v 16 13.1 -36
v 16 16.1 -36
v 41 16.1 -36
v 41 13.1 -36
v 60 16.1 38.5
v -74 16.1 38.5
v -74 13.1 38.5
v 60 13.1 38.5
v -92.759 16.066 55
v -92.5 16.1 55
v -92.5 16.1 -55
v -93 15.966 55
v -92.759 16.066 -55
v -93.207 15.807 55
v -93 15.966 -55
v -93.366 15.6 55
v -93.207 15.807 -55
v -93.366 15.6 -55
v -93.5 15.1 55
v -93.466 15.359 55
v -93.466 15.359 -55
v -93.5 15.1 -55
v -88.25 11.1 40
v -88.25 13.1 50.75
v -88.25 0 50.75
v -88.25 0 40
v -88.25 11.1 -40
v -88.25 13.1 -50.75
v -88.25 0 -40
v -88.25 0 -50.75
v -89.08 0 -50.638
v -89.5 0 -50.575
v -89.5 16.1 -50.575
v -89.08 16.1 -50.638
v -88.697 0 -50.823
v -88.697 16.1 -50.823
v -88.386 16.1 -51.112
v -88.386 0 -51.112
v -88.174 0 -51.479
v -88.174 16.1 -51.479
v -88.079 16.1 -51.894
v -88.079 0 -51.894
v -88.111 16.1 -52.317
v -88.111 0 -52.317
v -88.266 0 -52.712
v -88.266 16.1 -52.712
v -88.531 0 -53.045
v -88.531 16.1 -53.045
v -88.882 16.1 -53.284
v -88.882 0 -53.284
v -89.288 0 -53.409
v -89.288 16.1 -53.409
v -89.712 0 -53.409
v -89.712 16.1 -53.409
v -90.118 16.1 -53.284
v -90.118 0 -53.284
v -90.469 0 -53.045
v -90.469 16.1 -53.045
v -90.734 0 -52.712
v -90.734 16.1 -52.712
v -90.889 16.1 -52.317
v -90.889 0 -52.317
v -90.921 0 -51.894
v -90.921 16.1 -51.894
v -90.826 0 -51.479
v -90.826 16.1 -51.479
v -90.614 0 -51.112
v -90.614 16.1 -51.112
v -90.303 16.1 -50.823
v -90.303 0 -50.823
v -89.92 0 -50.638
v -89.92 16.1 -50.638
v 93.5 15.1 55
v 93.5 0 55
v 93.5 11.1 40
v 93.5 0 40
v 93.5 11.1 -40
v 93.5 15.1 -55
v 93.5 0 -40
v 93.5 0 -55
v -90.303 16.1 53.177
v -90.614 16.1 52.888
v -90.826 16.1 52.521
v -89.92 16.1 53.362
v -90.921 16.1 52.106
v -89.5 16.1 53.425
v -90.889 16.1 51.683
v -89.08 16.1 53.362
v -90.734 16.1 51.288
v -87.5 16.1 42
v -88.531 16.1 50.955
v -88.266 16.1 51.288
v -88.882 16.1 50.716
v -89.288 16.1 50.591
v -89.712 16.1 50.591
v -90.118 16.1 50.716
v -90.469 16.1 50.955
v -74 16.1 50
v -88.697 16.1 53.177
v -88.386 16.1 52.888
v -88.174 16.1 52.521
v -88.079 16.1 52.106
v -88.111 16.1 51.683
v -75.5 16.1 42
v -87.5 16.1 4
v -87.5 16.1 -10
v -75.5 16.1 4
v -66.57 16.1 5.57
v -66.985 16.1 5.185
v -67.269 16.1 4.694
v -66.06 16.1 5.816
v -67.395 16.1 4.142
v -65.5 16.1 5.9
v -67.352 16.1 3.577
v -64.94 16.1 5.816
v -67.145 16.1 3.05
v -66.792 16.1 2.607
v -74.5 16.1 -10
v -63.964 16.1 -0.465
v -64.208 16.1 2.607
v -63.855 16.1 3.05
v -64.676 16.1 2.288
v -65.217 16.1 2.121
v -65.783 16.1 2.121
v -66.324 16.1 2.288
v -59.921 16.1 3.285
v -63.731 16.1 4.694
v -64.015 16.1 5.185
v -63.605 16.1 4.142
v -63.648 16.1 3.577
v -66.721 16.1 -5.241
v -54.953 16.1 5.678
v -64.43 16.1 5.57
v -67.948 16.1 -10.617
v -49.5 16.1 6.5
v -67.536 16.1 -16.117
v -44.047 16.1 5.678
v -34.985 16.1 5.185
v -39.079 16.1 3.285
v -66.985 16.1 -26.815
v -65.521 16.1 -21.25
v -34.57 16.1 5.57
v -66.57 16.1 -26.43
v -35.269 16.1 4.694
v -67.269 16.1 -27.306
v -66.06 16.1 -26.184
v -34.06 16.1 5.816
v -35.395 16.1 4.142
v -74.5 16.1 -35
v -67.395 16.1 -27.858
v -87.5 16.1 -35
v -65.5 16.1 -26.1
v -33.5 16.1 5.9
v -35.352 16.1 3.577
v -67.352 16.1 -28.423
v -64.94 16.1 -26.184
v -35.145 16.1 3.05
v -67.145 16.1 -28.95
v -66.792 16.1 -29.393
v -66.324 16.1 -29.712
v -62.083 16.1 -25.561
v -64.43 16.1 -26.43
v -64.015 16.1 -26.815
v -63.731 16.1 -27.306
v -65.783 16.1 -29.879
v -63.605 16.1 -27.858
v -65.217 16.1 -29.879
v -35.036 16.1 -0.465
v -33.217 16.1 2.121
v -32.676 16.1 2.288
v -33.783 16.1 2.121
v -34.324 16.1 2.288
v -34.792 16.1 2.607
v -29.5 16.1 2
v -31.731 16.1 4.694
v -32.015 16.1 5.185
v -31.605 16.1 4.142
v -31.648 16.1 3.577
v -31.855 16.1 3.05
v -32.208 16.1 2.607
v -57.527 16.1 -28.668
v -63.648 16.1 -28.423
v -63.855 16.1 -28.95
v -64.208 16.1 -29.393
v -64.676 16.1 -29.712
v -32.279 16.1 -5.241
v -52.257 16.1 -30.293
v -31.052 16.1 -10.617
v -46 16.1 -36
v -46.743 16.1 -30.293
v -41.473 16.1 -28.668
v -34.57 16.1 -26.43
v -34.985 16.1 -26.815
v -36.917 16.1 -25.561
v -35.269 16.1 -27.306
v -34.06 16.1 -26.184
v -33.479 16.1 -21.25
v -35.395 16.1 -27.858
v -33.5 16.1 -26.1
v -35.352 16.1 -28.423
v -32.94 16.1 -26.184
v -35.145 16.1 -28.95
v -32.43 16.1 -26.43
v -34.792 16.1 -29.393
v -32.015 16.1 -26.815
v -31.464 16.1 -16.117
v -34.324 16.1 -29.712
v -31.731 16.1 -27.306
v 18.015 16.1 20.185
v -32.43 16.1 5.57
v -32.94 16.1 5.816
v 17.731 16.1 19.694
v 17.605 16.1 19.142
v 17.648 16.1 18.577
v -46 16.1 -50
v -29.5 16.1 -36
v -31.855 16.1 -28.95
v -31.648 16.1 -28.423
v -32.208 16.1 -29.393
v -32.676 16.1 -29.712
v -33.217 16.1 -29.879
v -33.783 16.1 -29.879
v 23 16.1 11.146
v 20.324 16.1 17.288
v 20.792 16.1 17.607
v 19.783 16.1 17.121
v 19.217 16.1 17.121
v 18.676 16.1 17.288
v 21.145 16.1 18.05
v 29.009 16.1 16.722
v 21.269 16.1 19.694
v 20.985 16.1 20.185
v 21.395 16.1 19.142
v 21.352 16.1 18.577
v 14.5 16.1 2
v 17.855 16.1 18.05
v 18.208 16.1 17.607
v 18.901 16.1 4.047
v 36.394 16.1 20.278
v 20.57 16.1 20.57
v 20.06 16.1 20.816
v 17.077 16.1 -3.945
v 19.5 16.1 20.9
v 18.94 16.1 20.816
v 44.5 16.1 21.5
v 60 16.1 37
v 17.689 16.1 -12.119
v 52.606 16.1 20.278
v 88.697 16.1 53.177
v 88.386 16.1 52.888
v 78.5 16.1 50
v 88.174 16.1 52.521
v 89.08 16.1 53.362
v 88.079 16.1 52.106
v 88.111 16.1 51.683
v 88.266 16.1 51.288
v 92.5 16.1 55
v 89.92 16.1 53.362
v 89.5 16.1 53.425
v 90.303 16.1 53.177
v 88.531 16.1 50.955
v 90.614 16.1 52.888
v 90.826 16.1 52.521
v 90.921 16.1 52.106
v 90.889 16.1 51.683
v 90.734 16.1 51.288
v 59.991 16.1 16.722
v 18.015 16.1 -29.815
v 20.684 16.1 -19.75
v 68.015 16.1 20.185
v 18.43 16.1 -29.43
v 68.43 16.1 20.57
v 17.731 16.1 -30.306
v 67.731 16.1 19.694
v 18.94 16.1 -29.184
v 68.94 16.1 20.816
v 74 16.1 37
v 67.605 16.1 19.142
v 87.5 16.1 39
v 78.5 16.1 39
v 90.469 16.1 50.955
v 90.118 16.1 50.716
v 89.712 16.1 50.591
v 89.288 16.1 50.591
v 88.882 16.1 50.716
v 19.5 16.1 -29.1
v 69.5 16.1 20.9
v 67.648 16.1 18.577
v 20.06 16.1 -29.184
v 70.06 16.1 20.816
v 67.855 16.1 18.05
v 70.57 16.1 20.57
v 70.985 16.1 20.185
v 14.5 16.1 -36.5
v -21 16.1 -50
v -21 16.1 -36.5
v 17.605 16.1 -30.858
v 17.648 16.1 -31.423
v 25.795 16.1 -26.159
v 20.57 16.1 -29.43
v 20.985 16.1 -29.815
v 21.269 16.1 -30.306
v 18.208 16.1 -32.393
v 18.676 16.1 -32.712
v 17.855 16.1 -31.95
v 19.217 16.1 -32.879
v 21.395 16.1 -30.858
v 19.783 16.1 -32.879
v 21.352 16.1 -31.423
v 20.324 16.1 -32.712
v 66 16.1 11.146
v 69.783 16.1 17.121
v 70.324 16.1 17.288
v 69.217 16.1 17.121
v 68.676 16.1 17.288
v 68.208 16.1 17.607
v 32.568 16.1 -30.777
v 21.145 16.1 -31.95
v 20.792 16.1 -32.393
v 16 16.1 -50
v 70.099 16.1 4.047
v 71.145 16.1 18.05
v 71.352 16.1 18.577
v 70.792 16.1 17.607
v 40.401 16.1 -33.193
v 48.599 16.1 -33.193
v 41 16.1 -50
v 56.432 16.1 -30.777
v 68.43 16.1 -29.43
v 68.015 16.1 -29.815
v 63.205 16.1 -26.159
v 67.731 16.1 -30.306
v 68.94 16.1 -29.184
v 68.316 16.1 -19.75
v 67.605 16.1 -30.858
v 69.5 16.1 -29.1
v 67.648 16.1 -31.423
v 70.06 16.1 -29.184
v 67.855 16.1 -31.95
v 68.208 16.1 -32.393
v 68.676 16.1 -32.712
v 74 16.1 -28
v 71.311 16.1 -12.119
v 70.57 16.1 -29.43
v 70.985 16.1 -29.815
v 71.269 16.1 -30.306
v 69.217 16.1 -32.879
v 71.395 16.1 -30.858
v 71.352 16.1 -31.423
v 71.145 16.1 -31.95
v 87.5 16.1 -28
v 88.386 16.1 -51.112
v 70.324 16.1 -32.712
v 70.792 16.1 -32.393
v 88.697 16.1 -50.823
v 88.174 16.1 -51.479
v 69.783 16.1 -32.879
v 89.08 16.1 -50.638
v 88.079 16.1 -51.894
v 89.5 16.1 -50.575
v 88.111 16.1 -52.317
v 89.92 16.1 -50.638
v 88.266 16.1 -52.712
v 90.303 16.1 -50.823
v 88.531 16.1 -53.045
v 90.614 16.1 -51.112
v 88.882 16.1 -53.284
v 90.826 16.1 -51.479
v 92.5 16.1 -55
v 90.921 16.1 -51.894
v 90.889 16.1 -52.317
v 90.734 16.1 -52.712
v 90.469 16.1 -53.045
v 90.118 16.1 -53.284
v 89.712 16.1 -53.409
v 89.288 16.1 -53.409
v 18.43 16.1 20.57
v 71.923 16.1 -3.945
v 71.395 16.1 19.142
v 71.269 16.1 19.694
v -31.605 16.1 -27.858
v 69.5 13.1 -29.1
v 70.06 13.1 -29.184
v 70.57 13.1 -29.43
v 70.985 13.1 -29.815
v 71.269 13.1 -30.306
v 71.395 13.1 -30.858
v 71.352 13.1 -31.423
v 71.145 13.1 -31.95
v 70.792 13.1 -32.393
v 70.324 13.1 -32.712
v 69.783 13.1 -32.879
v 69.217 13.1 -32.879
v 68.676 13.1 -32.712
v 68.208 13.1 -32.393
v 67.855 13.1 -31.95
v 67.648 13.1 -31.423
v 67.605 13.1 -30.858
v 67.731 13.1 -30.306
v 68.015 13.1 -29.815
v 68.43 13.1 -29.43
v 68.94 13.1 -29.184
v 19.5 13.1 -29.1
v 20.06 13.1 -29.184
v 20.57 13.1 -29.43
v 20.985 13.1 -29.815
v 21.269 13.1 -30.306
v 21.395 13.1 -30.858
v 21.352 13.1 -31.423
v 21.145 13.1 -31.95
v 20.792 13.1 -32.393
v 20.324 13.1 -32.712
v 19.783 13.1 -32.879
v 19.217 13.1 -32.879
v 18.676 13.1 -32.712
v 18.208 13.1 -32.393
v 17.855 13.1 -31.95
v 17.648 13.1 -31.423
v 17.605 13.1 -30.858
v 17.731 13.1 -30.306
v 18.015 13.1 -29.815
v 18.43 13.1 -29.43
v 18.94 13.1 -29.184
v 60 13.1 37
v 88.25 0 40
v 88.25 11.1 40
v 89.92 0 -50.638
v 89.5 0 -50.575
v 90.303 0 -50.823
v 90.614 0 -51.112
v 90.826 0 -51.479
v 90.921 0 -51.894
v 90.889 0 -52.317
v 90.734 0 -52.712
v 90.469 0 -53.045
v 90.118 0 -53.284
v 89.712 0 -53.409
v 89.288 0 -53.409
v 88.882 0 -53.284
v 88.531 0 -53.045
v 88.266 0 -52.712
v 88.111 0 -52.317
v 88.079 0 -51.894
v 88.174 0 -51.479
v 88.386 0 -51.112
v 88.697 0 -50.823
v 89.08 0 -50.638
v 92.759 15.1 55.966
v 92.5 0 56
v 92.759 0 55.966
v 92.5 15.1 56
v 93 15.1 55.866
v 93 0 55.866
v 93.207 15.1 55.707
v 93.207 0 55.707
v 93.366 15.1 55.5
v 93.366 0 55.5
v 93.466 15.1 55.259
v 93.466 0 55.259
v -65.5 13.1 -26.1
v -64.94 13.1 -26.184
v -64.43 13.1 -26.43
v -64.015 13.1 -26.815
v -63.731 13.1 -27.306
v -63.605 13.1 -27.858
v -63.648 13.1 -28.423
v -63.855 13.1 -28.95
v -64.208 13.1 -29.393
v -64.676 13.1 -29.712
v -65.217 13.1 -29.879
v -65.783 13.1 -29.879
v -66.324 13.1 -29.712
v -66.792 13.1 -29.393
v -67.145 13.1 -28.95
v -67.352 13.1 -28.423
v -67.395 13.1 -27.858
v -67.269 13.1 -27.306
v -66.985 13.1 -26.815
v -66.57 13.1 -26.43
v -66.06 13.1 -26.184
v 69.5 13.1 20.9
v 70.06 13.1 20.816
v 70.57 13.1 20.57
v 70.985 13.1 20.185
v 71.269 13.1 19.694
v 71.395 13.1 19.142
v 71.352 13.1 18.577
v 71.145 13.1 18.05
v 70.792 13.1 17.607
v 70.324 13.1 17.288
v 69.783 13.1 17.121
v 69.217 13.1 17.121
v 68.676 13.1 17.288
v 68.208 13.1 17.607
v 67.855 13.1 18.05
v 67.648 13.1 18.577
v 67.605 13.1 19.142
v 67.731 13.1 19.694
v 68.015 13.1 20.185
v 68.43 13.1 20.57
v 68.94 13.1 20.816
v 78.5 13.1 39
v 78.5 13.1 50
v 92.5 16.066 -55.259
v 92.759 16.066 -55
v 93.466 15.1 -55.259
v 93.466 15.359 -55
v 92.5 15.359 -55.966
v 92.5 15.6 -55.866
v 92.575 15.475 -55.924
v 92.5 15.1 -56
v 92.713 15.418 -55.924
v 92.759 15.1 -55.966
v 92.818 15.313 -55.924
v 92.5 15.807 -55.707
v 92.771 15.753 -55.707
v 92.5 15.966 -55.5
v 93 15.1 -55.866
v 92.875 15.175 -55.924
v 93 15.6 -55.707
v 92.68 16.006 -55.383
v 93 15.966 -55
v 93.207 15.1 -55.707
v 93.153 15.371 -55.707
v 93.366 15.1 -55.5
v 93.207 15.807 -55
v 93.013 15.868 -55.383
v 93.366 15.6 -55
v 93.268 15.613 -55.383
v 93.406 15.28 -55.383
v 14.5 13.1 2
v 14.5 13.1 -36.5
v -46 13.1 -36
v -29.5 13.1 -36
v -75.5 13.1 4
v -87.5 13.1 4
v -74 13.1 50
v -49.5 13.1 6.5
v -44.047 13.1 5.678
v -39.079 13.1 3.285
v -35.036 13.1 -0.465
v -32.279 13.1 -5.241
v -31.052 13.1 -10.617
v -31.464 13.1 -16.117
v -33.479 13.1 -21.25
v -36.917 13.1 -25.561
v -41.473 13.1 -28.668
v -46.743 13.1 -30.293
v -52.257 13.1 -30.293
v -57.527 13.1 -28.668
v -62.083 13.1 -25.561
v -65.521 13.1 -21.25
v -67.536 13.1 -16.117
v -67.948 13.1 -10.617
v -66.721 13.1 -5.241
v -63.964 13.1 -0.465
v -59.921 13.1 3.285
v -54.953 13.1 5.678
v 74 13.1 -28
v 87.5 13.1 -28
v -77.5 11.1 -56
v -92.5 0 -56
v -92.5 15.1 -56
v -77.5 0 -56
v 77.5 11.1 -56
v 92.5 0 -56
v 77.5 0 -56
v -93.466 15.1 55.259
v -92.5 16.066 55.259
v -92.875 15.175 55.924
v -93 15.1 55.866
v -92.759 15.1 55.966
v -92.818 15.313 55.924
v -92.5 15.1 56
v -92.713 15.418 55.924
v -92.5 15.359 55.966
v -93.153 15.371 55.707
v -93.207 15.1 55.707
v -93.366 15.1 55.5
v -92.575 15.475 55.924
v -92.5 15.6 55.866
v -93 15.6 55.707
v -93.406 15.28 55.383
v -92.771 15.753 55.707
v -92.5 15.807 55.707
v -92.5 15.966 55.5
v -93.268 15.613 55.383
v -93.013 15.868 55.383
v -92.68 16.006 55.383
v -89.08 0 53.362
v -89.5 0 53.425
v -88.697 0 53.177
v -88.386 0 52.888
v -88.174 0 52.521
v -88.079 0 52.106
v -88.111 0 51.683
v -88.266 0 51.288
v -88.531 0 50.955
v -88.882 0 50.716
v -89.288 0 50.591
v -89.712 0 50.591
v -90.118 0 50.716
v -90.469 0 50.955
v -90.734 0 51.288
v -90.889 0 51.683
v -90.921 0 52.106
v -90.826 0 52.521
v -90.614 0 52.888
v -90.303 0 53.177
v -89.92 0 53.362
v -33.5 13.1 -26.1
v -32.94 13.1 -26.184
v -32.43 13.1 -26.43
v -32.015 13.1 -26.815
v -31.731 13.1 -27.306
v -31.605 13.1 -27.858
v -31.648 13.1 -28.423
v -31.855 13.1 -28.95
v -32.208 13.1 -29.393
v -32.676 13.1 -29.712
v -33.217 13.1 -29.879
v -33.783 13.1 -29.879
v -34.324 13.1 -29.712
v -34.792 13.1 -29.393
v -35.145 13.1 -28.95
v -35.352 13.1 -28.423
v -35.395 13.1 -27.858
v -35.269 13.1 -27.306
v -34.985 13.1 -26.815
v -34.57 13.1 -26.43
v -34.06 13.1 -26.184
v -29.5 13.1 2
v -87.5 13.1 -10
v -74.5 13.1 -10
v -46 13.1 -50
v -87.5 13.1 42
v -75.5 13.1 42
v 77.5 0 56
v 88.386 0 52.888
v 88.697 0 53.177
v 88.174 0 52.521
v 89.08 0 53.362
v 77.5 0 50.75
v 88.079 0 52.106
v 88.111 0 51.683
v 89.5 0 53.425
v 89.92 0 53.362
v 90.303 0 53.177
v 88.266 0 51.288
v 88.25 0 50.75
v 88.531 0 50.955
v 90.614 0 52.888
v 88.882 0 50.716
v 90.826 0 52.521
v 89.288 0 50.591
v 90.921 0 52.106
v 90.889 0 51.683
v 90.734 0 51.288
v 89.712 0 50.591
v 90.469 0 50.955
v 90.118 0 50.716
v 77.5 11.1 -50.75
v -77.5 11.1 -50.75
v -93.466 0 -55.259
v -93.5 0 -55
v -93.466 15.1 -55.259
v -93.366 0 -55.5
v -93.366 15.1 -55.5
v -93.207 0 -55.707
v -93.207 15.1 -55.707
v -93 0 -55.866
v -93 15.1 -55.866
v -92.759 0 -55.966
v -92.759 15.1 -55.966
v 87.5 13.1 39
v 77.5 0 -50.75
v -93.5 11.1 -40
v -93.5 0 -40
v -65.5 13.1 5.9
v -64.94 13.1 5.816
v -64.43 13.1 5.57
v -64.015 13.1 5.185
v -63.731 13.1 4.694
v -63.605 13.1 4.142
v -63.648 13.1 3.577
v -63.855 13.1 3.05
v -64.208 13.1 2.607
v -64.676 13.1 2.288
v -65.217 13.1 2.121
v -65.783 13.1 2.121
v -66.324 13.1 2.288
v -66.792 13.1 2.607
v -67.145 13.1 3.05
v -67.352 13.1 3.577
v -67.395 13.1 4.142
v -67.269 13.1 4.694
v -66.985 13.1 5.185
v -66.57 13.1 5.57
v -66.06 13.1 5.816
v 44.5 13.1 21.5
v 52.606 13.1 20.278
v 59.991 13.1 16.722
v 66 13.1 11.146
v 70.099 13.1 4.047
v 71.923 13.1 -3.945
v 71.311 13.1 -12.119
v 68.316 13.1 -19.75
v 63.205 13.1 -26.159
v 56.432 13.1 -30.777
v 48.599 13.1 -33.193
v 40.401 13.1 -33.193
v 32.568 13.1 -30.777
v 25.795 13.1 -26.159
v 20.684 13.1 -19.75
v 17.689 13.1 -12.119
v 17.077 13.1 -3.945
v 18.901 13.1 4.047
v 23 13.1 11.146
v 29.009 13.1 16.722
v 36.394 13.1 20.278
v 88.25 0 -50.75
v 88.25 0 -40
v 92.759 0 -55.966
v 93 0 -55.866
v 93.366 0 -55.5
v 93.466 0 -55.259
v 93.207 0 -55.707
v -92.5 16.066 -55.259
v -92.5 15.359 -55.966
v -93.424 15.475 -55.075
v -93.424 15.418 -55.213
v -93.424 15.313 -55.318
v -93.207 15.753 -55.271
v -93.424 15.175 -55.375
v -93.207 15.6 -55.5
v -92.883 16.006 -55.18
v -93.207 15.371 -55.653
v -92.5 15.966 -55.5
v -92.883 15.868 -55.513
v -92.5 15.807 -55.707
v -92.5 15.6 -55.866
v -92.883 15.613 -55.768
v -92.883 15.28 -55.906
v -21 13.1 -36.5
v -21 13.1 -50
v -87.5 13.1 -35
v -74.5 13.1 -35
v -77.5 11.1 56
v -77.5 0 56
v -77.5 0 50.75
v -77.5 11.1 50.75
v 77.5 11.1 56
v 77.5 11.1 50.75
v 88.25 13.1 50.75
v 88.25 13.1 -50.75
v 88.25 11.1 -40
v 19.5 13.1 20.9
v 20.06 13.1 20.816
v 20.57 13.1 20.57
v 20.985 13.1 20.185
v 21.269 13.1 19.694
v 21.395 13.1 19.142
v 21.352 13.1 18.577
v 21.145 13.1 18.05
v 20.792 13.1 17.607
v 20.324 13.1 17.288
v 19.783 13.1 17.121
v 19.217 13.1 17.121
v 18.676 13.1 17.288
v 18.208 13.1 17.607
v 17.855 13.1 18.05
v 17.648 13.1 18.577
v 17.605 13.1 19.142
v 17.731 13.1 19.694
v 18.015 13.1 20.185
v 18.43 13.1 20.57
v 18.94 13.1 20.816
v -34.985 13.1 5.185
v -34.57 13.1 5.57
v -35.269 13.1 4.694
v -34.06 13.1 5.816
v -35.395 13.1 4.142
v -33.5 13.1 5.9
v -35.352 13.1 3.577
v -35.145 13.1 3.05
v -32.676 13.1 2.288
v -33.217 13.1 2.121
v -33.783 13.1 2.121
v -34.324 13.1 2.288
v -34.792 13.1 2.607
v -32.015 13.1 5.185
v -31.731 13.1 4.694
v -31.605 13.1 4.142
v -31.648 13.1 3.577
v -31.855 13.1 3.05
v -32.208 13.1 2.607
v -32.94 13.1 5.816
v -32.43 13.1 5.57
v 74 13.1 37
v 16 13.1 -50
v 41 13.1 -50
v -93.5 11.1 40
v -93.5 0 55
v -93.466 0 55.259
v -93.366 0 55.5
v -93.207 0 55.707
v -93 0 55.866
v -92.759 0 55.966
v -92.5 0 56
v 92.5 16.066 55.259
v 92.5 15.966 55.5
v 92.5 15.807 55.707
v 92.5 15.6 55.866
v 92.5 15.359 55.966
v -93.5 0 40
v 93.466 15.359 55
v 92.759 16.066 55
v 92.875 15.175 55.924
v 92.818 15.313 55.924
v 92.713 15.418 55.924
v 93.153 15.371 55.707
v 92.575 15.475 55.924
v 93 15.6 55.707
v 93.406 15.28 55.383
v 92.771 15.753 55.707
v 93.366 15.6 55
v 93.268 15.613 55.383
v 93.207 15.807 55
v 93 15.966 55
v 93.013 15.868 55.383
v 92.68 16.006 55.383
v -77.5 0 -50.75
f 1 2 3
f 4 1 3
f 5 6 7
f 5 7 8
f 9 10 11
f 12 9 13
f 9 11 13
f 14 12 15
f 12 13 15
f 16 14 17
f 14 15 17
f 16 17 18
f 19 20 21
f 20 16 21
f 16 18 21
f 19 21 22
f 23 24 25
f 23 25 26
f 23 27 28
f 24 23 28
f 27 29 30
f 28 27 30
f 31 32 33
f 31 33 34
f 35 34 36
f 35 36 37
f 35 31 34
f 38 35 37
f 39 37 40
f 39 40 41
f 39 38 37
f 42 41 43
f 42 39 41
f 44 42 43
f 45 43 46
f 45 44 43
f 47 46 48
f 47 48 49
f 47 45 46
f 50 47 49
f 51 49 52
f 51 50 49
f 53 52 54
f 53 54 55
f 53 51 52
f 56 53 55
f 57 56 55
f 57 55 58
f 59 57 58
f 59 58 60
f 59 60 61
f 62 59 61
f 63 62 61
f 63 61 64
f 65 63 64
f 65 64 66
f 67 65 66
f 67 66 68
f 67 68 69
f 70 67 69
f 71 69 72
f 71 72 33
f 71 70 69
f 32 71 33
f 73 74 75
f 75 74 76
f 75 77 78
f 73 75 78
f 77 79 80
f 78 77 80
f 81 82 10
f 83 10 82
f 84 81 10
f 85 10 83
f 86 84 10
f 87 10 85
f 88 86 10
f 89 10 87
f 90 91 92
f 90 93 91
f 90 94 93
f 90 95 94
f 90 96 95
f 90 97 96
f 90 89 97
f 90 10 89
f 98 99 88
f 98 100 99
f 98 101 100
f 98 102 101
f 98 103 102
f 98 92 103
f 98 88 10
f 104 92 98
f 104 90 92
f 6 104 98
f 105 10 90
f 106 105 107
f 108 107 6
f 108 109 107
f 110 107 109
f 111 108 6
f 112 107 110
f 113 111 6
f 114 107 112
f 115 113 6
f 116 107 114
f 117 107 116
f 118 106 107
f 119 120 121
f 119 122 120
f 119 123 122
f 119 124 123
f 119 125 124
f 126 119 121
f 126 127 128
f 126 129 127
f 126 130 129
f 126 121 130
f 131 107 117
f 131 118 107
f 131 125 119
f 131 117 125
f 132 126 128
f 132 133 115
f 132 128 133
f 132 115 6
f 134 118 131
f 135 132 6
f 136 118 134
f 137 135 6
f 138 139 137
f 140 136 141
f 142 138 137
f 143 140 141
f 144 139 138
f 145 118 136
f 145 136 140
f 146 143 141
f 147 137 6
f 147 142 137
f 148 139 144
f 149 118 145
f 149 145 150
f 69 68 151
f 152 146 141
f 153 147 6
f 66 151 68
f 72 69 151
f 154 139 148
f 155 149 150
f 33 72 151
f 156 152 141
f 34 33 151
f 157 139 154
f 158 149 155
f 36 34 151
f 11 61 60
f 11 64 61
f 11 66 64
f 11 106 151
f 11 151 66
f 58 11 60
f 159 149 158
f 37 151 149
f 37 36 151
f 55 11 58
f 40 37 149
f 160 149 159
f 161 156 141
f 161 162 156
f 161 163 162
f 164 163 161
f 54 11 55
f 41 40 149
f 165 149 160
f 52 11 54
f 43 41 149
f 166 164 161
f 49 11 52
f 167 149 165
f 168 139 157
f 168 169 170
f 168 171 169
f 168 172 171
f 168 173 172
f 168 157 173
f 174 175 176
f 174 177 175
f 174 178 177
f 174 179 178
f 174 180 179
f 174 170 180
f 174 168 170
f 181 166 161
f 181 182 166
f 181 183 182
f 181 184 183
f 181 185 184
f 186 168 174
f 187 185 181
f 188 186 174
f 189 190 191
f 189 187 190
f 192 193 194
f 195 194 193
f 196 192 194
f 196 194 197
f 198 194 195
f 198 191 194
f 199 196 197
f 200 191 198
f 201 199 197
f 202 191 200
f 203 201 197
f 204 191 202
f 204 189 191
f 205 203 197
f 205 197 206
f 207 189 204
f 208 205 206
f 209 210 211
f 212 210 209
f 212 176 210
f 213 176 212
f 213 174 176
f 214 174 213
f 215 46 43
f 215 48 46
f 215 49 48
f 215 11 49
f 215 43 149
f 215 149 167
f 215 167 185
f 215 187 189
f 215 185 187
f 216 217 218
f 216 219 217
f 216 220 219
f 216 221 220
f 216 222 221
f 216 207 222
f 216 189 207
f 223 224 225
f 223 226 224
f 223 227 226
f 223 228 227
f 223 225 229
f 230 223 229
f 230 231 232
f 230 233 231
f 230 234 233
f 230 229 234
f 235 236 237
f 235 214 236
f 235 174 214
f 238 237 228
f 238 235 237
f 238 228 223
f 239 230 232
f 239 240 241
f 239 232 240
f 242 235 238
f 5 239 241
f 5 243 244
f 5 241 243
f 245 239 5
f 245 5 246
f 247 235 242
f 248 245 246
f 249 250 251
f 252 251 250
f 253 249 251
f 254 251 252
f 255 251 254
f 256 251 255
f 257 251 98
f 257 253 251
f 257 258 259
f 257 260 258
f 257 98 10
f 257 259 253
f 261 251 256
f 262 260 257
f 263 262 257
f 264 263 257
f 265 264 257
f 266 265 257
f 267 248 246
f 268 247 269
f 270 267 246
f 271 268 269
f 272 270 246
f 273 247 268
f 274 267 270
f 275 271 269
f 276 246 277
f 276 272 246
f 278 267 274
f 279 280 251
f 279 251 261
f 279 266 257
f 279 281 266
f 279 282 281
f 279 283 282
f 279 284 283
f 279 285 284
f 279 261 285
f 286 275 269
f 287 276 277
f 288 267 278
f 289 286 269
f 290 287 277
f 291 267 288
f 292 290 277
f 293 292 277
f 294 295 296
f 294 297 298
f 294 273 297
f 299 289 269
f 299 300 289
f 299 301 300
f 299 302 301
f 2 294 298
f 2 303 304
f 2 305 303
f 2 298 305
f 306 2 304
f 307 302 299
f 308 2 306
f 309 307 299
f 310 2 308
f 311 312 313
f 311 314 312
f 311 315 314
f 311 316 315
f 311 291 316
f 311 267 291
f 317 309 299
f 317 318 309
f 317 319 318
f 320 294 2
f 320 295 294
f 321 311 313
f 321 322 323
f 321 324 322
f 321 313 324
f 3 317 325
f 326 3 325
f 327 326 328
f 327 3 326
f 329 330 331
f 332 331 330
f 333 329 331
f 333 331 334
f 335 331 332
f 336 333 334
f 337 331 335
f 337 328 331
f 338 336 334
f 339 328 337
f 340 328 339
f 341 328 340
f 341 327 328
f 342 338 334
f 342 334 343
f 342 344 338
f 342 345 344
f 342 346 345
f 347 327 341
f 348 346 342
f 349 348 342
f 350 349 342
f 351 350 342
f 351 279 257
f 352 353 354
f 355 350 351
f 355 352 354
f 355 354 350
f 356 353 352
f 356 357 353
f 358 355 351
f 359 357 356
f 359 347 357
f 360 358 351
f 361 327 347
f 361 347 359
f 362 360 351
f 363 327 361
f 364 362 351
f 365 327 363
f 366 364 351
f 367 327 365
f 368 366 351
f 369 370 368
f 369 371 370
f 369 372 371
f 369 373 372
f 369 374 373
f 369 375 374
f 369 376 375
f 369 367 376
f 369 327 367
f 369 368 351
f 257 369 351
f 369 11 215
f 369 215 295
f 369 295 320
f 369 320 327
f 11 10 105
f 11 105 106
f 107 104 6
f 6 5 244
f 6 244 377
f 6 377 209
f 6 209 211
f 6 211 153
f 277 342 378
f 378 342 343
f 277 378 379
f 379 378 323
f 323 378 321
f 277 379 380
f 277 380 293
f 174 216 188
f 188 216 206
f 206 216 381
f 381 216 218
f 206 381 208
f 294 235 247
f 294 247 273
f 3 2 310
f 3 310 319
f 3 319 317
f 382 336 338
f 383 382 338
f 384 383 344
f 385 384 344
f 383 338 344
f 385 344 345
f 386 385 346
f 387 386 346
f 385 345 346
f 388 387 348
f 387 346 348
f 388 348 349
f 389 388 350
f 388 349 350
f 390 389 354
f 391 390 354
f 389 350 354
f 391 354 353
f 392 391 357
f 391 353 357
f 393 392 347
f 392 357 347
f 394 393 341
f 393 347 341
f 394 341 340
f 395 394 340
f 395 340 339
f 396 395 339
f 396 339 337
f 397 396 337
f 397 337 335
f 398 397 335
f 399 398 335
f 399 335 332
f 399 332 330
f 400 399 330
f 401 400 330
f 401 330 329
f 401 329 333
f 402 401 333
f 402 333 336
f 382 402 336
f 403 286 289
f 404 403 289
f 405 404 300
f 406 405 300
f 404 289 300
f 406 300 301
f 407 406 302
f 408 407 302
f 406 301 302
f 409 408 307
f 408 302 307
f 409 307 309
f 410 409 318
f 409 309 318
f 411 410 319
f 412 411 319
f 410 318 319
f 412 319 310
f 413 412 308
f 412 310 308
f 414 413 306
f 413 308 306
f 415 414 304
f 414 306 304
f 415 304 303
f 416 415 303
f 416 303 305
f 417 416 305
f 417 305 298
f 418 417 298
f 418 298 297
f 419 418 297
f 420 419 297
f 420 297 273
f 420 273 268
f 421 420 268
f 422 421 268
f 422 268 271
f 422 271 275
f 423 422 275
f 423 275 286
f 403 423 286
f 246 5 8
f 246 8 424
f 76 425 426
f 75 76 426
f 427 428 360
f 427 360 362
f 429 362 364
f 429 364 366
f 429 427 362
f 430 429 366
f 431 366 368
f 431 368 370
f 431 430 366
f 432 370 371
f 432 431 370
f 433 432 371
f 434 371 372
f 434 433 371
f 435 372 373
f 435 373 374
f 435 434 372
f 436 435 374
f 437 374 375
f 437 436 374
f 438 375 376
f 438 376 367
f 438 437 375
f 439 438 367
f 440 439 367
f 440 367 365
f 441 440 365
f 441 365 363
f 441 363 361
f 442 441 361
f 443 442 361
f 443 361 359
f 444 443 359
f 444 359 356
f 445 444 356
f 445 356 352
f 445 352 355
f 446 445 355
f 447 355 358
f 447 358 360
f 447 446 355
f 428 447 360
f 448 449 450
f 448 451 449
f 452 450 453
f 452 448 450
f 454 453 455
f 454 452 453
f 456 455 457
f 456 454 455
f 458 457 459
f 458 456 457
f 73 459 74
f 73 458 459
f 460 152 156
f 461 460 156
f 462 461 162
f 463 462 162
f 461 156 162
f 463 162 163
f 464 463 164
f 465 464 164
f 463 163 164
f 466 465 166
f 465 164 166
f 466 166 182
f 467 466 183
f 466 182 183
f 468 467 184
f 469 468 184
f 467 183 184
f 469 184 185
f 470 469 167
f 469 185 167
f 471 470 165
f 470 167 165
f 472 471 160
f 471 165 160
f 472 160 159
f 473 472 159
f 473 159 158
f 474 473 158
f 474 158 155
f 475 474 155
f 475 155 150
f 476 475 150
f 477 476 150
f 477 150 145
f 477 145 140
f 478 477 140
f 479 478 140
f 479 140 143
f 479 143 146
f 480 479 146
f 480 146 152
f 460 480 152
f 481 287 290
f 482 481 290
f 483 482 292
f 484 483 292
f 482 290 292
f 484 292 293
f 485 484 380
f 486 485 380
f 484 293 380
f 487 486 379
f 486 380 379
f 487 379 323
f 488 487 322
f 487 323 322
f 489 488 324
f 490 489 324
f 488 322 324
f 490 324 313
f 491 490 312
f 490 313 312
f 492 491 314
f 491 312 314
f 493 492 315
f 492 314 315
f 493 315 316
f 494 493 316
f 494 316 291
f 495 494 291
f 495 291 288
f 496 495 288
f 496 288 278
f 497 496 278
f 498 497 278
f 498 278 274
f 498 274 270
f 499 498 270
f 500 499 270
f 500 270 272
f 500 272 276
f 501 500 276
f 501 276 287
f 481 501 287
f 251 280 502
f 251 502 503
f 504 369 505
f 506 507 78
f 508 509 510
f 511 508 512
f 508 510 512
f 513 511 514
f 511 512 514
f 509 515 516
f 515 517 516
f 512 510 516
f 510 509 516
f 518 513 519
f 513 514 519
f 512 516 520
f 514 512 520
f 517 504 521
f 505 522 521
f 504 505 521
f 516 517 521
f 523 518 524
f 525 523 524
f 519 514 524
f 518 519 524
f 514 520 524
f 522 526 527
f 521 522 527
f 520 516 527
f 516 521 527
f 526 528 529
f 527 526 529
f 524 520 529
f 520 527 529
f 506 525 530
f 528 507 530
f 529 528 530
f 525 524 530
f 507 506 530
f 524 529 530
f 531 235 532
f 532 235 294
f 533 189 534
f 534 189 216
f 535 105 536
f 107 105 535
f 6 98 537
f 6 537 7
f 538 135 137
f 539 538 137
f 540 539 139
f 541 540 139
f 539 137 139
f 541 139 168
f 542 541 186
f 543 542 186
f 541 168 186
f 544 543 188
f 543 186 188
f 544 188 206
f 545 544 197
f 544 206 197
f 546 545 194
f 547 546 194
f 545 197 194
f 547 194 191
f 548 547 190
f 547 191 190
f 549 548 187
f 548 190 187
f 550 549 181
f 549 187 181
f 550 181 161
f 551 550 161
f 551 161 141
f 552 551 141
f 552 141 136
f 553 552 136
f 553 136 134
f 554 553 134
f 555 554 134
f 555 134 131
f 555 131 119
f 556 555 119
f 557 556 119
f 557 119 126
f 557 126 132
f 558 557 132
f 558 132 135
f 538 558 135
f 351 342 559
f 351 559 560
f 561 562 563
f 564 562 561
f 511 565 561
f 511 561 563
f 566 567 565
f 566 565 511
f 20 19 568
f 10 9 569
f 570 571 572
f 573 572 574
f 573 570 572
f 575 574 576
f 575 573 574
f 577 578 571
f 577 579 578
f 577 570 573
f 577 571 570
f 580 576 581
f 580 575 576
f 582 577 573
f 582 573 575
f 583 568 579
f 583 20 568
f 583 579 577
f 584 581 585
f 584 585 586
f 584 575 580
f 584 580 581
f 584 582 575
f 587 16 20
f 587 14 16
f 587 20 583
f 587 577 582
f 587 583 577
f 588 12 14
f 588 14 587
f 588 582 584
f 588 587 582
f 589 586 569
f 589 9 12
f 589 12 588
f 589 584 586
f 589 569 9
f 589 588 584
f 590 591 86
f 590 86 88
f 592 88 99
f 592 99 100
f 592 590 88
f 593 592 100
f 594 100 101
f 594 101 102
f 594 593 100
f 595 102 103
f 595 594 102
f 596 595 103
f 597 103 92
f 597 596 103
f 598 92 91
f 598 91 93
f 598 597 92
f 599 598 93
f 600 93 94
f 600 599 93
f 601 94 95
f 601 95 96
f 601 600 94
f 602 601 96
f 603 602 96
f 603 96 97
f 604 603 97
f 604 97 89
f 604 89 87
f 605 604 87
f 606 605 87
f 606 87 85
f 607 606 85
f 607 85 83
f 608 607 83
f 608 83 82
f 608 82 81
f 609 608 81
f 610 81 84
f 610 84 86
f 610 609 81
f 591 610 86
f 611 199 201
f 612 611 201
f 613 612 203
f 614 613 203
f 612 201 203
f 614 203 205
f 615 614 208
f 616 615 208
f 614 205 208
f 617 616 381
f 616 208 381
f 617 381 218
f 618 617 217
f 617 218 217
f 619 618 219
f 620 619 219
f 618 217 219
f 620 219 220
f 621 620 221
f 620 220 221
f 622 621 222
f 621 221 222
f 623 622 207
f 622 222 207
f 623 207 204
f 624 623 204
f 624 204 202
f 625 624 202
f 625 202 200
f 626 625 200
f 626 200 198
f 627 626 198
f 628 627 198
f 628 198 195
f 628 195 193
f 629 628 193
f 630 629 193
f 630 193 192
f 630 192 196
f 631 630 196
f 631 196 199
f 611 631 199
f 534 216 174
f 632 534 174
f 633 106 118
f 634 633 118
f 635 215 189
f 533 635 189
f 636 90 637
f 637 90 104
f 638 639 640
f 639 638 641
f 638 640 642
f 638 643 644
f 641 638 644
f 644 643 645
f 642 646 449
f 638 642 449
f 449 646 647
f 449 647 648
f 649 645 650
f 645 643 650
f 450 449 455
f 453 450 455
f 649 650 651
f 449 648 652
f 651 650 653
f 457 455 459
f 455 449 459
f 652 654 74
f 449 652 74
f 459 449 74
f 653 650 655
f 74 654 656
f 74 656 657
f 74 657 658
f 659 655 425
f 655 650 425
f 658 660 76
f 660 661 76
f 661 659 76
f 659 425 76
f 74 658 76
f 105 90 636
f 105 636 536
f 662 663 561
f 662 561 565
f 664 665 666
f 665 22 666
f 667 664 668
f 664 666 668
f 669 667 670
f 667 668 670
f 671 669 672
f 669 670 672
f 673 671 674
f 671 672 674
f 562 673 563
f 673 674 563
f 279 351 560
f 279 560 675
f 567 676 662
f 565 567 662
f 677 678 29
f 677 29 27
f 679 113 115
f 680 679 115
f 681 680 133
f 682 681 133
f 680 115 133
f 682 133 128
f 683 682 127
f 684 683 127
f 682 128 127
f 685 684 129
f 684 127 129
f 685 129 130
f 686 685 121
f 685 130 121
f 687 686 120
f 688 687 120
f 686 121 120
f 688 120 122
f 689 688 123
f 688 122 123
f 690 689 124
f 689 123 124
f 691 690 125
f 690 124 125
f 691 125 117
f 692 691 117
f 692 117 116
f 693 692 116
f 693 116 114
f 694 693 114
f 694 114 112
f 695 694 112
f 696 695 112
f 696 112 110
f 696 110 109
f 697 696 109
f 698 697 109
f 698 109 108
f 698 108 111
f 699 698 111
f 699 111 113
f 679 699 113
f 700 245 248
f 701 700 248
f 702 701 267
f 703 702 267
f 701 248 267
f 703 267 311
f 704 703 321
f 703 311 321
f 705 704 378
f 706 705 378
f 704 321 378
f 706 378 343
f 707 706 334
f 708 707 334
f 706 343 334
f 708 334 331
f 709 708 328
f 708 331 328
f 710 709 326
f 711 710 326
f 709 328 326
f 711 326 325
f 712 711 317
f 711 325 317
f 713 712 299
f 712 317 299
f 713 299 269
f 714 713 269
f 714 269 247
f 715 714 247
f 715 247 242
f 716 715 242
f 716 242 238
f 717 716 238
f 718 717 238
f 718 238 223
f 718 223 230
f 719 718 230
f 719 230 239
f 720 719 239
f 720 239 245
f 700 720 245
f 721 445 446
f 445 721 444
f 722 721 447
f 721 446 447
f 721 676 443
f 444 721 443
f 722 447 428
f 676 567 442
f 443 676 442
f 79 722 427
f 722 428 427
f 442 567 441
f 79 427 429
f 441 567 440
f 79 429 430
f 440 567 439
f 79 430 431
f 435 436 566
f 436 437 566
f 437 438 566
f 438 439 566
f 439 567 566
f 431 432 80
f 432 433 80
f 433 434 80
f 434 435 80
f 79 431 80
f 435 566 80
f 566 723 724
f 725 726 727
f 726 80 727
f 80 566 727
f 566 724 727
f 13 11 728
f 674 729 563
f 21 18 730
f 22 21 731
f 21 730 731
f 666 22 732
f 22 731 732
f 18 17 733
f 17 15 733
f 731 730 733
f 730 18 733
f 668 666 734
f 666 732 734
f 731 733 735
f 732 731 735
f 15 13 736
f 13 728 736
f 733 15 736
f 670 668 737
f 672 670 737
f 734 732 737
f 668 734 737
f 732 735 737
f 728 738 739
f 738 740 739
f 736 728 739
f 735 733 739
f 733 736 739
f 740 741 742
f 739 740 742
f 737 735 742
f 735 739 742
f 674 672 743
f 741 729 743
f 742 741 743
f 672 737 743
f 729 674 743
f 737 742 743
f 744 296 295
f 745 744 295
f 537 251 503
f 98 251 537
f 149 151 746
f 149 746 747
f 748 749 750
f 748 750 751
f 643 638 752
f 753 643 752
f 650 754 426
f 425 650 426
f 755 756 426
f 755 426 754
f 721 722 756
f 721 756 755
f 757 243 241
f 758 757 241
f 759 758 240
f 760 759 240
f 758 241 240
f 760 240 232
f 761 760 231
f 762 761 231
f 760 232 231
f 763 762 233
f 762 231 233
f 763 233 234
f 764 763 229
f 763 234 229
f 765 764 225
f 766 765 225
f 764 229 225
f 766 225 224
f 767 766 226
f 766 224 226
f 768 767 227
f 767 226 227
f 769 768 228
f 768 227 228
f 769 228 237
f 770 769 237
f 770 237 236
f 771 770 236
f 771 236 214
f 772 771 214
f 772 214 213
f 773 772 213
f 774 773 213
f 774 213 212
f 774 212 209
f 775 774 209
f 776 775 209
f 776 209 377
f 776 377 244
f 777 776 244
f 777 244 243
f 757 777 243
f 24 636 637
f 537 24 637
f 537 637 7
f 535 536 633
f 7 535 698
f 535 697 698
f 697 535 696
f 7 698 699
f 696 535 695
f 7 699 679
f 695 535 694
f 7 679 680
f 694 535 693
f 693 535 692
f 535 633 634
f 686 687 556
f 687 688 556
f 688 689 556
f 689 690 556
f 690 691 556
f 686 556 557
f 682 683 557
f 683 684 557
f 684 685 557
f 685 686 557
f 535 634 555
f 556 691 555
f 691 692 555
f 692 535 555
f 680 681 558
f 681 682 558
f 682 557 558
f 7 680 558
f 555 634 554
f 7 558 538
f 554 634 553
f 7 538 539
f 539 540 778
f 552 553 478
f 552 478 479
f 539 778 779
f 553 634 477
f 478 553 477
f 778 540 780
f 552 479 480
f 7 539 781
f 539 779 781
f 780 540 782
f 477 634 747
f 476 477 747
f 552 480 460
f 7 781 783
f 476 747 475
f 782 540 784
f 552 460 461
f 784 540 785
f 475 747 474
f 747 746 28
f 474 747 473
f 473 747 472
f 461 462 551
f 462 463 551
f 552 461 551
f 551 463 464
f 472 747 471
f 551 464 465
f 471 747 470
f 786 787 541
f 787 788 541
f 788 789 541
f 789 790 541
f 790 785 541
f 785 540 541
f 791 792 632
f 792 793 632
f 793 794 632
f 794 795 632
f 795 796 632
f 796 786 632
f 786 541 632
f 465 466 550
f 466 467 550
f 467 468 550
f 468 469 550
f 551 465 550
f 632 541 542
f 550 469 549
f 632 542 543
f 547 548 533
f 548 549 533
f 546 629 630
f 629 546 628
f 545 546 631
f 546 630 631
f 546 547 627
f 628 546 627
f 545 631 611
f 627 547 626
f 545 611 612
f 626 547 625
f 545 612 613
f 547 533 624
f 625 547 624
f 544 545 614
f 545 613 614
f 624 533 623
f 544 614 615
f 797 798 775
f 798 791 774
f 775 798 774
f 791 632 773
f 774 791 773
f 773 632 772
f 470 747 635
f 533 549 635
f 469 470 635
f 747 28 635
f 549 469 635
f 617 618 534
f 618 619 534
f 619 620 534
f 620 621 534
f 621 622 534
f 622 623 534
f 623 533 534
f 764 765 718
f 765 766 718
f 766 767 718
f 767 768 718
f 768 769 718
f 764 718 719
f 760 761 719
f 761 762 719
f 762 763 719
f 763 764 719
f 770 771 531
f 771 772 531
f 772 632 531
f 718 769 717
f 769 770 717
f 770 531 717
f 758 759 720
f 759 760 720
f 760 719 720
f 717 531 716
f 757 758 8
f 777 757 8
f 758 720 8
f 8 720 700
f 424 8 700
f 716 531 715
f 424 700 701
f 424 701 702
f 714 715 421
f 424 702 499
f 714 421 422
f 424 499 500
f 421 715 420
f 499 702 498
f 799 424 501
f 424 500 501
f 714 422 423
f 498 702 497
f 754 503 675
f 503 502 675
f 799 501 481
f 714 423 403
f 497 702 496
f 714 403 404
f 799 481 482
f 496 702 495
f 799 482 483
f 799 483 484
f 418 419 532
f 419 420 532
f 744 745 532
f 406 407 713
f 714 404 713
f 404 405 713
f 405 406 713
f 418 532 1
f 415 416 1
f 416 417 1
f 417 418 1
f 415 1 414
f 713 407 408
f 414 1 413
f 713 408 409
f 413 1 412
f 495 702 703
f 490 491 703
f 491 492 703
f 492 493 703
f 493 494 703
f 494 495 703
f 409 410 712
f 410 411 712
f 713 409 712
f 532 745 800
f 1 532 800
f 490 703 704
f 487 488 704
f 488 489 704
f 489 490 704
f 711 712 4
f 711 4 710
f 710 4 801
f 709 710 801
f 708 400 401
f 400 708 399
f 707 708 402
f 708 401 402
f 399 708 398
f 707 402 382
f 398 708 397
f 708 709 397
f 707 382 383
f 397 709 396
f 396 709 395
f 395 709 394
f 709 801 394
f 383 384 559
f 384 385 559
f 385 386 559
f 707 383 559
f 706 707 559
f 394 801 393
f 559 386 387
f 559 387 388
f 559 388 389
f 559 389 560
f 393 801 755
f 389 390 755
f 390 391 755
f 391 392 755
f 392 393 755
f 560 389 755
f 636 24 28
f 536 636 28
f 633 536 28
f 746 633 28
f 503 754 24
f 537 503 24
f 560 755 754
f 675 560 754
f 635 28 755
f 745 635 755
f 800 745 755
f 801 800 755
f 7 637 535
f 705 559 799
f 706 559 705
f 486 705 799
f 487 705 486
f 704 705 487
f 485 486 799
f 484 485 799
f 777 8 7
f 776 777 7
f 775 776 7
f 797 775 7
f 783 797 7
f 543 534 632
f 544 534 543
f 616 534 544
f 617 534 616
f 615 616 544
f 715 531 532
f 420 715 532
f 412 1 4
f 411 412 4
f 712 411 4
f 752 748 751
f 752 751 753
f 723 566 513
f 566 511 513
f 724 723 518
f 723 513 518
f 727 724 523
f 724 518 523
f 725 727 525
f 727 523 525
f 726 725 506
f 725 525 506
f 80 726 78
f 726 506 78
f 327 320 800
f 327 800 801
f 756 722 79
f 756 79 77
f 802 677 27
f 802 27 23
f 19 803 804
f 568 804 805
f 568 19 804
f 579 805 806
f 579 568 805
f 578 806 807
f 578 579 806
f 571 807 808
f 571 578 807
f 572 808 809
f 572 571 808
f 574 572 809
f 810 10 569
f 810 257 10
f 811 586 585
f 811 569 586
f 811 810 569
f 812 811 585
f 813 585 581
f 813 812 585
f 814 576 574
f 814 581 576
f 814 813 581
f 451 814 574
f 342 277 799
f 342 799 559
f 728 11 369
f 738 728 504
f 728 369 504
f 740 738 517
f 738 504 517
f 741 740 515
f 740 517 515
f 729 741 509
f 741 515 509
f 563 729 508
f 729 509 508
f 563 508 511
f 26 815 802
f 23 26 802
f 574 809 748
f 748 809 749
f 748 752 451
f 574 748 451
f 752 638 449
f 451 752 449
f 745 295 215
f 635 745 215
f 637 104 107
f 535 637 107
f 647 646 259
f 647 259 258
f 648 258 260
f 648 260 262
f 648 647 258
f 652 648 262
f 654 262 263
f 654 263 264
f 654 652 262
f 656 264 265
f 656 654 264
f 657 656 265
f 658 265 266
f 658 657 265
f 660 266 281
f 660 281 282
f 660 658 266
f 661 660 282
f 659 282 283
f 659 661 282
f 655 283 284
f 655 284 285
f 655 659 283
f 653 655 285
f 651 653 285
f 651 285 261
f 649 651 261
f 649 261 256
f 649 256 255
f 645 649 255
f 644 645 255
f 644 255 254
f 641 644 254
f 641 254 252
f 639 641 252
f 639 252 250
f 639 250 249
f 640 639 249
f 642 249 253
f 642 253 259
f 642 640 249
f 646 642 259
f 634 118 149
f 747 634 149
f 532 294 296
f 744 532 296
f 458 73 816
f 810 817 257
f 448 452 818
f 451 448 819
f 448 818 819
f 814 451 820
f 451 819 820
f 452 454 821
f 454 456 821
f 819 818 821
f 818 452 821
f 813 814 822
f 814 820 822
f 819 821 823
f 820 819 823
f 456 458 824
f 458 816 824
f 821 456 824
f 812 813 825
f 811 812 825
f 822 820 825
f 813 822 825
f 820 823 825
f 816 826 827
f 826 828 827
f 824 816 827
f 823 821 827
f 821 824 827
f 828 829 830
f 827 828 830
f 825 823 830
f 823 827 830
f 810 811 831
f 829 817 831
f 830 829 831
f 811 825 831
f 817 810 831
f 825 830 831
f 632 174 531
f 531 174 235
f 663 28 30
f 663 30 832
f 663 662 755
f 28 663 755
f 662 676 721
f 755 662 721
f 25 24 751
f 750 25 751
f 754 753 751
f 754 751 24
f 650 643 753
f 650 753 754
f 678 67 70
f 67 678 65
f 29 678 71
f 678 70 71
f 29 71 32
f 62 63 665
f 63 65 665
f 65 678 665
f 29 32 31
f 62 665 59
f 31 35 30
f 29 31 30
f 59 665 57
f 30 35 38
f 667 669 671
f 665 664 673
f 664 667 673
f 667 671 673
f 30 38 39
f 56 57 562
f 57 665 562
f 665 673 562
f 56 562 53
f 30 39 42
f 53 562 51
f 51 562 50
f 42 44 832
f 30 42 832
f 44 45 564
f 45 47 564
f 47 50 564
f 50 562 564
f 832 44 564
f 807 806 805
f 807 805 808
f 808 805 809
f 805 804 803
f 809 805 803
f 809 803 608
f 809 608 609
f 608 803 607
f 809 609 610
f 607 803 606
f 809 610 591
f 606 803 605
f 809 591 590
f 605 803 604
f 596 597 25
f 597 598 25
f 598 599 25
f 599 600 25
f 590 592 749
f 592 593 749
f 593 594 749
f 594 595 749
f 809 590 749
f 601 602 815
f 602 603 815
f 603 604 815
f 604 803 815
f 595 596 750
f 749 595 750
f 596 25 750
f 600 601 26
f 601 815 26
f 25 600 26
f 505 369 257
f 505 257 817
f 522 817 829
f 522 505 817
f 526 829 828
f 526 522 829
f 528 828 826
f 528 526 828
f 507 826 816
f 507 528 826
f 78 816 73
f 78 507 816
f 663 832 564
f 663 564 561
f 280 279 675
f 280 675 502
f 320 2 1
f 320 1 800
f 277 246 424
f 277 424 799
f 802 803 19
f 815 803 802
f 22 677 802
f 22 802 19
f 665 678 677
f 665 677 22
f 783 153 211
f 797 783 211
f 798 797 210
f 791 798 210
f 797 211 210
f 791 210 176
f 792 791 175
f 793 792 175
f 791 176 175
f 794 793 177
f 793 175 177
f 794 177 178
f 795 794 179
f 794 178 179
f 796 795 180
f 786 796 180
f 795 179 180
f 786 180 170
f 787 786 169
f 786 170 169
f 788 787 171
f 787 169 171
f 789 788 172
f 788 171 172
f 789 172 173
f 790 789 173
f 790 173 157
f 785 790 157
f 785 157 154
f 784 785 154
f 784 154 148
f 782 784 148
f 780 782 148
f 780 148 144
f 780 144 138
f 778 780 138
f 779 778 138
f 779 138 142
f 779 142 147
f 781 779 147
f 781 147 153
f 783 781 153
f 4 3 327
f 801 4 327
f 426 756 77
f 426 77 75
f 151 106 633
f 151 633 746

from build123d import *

# Parameters (mm, degrees)
SKETCH1_W                = 187
SKETCH1_H                = 112
SKETCH1_R                = 1.425
SKETCH1_W_2              = 176.5
SKETCH1_H_2              = 101.5
EDGE_2_DEPTH             = 16.1
SKETCH2_W                = 176.5
SKETCH2_H                = 101.5
TOP_COVER_DEPTH          = 3
COMPONENTS_CUTOUTS_REACH = 112.17
SKETCH3_W                = 12
SKETCH3_H                = 38
SKETCH3_W_2              = 13
SKETCH3_H_2              = 25
SKETCH3_W_3              = 25
SKETCH3_H_3              = 14
FAN_HOLES_REACH          = 112.17
SKETCH6_R                = 1.9
SKETCH6_R_2              = 18.5
SKETCH6_R_3              = 27.5
SKETCH4_W                = 155
SKETCH4_H                = 11.1
LENGTH_AIR_VENTS_DEPTH   = 147.783718443
SKETCH5_W                = 80
SKETCH5_H                = 11.1
WIDTH_AIR_VENTS_DEPTH    = 196.867838095
FILLET1_R                = 1


with BuildPart() as part:
    # Sketch1 → Edge 2 (new body)
    with BuildSketch(Plane(origin=(0, 0, 0), x_dir=(1, 0, 0), z_dir=(0, 1, 0))):
        Rectangle(SKETCH1_W, SKETCH1_H)
        with Locations((-89.5, -52)):
            Circle(SKETCH1_R, mode=Mode.SUBTRACT)
        with Locations((89.5, -52)):
            Circle(SKETCH1_R, mode=Mode.SUBTRACT)
        with Locations((89.5, 52)):
            Circle(SKETCH1_R, mode=Mode.SUBTRACT)
        with Locations((-89.5, 52)):
            Circle(SKETCH1_R, mode=Mode.SUBTRACT)
        Rectangle(SKETCH1_W_2, SKETCH1_H_2, mode=Mode.SUBTRACT)
    extrude(amount=EDGE_2_DEPTH)

    # Sketch2 → Top Cover (add)
    with BuildSketch(Plane(origin=(0, 16.1, 0), x_dir=(1, 0, 0), z_dir=(0, 1, 0))):
        Rectangle(SKETCH2_W, SKETCH2_H)
    extrude(amount=-TOP_COVER_DEPTH)

    # Sketch3 → Components Cutouts (cut, up to next)
    with BuildSketch(Plane(origin=(0, 16.1, 0), x_dir=(1, 0, 0), z_dir=(0, 1, 0)), mode=Mode.PRIVATE) as components_cutouts_sk1:
        with Locations((-81.5, -23)):
            Rectangle(SKETCH3_W, SKETCH3_H)
    components_cutouts_tool1 = extrude(components_cutouts_sk1.sketch, amount=-COMPONENTS_CUTOUTS_REACH, mode=Mode.PRIVATE) & part.part
    # Sketch3 → Components Cutouts (cut, up to next)
    with BuildSketch(Plane(origin=(0, 16.1, 0), x_dir=(1, 0, 0), z_dir=(0, 1, 0)), mode=Mode.PRIVATE) as components_cutouts_sk2:
        Polygon((-29.5, 36), (-29.5, -2), (14.5, -2), (14.5, 36.5), (-21, 36.5), (-21, 50), (-46, 50), (-46, 36), align=None)
    components_cutouts_tool2 = extrude(components_cutouts_sk2.sketch, amount=-COMPONENTS_CUTOUTS_REACH, mode=Mode.PRIVATE) & part.part
    # Sketch3 → Components Cutouts (cut, up to next)
    with BuildSketch(Plane(origin=(0, 16.1, 0), x_dir=(1, 0, 0), z_dir=(0, 1, 0)), mode=Mode.PRIVATE) as components_cutouts_sk3:
        with Locations((-81, 22.5)):
            Rectangle(SKETCH3_W_2, SKETCH3_H_2)
    components_cutouts_tool3 = extrude(components_cutouts_sk3.sketch, amount=-COMPONENTS_CUTOUTS_REACH, mode=Mode.PRIVATE) & part.part
    # Sketch3 → Components Cutouts (cut, up to next)
    with BuildSketch(Plane(origin=(0, 16.1, 0), x_dir=(1, 0, 0), z_dir=(0, 1, 0)), mode=Mode.PRIVATE) as components_cutouts_sk4:
        Polygon((60, -38.5), (60, -37), (74, -37), (74, 28), (87.5, 28), (87.5, -39), (78.5, -39), (78.5, -50), (-74, -50), (-74, -38.5), align=None)
    components_cutouts_tool4 = extrude(components_cutouts_sk4.sketch, amount=-COMPONENTS_CUTOUTS_REACH, mode=Mode.PRIVATE) & part.part
    # Sketch3 → Components Cutouts (cut, up to next)
    with BuildSketch(Plane(origin=(0, 16.1, 0), x_dir=(1, 0, 0), z_dir=(0, 1, 0)), mode=Mode.PRIVATE) as components_cutouts_sk5:
        with Locations((28.5, 43)):
            Rectangle(SKETCH3_W_3, SKETCH3_H_3)
    components_cutouts_tool5 = extrude(components_cutouts_sk5.sketch, amount=-COMPONENTS_CUTOUTS_REACH, mode=Mode.PRIVATE) & part.part
    add(components_cutouts_tool1.solids().sort_by_distance((-81.5, 16.1, 23))[0], mode=Mode.SUBTRACT)
    add(components_cutouts_tool2.solids().sort_by_distance((-11.924347, 16.1, -21.628845))[0], mode=Mode.SUBTRACT)
    add(components_cutouts_tool3.solids().sort_by_distance((-81, 16.1, -22.5))[0], mode=Mode.SUBTRACT)
    add(components_cutouts_tool4.solids().sort_by_distance((61.793495, 16.1, 37.75))[0], mode=Mode.SUBTRACT)
    add(components_cutouts_tool5.solids().sort_by_distance((28.5, 16.1, -43))[0], mode=Mode.SUBTRACT)

    # Sketch6 → Fan Holes (cut, up to next)
    with BuildSketch(Plane(origin=(0, 16.1, 0), x_dir=(1, 0, 0), z_dir=(0, 1, 0)), mode=Mode.PRIVATE) as fan_holes_sk1:
        with Locations((-65.5, -4)):
            Circle(SKETCH6_R)
    fan_holes_tool1 = extrude(fan_holes_sk1.sketch, amount=-FAN_HOLES_REACH, mode=Mode.PRIVATE) & part.part
    # Sketch6 → Fan Holes (cut, up to next)
    with BuildSketch(Plane(origin=(0, 16.1, 0), x_dir=(1, 0, 0), z_dir=(0, 1, 0)), mode=Mode.PRIVATE) as fan_holes_sk2:
        with Locations((-65.5, 28)):
            Circle(SKETCH6_R)
    fan_holes_tool2 = extrude(fan_holes_sk2.sketch, amount=-FAN_HOLES_REACH, mode=Mode.PRIVATE) & part.part
    # Sketch6 → Fan Holes (cut, up to next)
    with BuildSketch(Plane(origin=(0, 16.1, 0), x_dir=(1, 0, 0), z_dir=(0, 1, 0)), mode=Mode.PRIVATE) as fan_holes_sk3:
        with Locations((-33.5, 28)):
            Circle(SKETCH6_R)
    fan_holes_tool3 = extrude(fan_holes_sk3.sketch, amount=-FAN_HOLES_REACH, mode=Mode.PRIVATE) & part.part
    # Sketch6 → Fan Holes (cut, up to next)
    with BuildSketch(Plane(origin=(0, 16.1, 0), x_dir=(1, 0, 0), z_dir=(0, 1, 0)), mode=Mode.PRIVATE) as fan_holes_sk4:
        with Locations((-33.5, -4)):
            Circle(SKETCH6_R)
    fan_holes_tool4 = extrude(fan_holes_sk4.sketch, amount=-FAN_HOLES_REACH, mode=Mode.PRIVATE) & part.part
    # Sketch6 → Fan Holes (cut, up to next)
    with BuildSketch(Plane(origin=(0, 16.1, 0), x_dir=(1, 0, 0), z_dir=(0, 1, 0)), mode=Mode.PRIVATE) as fan_holes_sk5:
        with Locations((-49.5, 12)):
            Circle(SKETCH6_R_2)
    fan_holes_tool5 = extrude(fan_holes_sk5.sketch, amount=-FAN_HOLES_REACH, mode=Mode.PRIVATE) & part.part
    # Sketch6 → Fan Holes (cut, up to next)
    with BuildSketch(Plane(origin=(0, 16.1, 0), x_dir=(1, 0, 0), z_dir=(0, 1, 0)), mode=Mode.PRIVATE) as fan_holes_sk6:
        with Locations((44.5, 6)):
            Circle(SKETCH6_R_3)
    fan_holes_tool6 = extrude(fan_holes_sk6.sketch, amount=-FAN_HOLES_REACH, mode=Mode.PRIVATE) & part.part
    # Sketch6 → Fan Holes (cut, up to next)
    with BuildSketch(Plane(origin=(0, 16.1, 0), x_dir=(1, 0, 0), z_dir=(0, 1, 0)), mode=Mode.PRIVATE) as fan_holes_sk7:
        with Locations((19.5, -19)):
            Circle(SKETCH6_R)
    fan_holes_tool7 = extrude(fan_holes_sk7.sketch, amount=-FAN_HOLES_REACH, mode=Mode.PRIVATE) & part.part
    # Sketch6 → Fan Holes (cut, up to next)
    with BuildSketch(Plane(origin=(0, 16.1, 0), x_dir=(1, 0, 0), z_dir=(0, 1, 0)), mode=Mode.PRIVATE) as fan_holes_sk8:
        with Locations((69.5, -19)):
            Circle(SKETCH6_R)
    fan_holes_tool8 = extrude(fan_holes_sk8.sketch, amount=-FAN_HOLES_REACH, mode=Mode.PRIVATE) & part.part
    # Sketch6 → Fan Holes (cut, up to next)
    with BuildSketch(Plane(origin=(0, 16.1, 0), x_dir=(1, 0, 0), z_dir=(0, 1, 0)), mode=Mode.PRIVATE) as fan_holes_sk9:
        with Locations((69.5, 31)):
            Circle(SKETCH6_R)
    fan_holes_tool9 = extrude(fan_holes_sk9.sketch, amount=-FAN_HOLES_REACH, mode=Mode.PRIVATE) & part.part
    # Sketch6 → Fan Holes (cut, up to next)
    with BuildSketch(Plane(origin=(0, 16.1, 0), x_dir=(1, 0, 0), z_dir=(0, 1, 0)), mode=Mode.PRIVATE) as fan_holes_sk10:
        with Locations((19.5, 31)):
            Circle(SKETCH6_R)
    fan_holes_tool10 = extrude(fan_holes_sk10.sketch, amount=-FAN_HOLES_REACH, mode=Mode.PRIVATE) & part.part
    add(fan_holes_tool1.solids().sort_by_distance((-65.5, 16.1, 4))[0], mode=Mode.SUBTRACT)
    add(fan_holes_tool2.solids().sort_by_distance((-65.5, 16.1, -28))[0], mode=Mode.SUBTRACT)
    add(fan_holes_tool3.solids().sort_by_distance((-33.5, 16.1, -28))[0], mode=Mode.SUBTRACT)
    add(fan_holes_tool4.solids().sort_by_distance((-33.5, 16.1, 4))[0], mode=Mode.SUBTRACT)
    add(fan_holes_tool5.solids().sort_by_distance((-49.5, 16.1, -12))[0], mode=Mode.SUBTRACT)
    add(fan_holes_tool6.solids().sort_by_distance((44.5, 16.1, -6))[0], mode=Mode.SUBTRACT)
    add(fan_holes_tool7.solids().sort_by_distance((19.5, 16.1, 19))[0], mode=Mode.SUBTRACT)
    add(fan_holes_tool8.solids().sort_by_distance((69.5, 16.1, 19))[0], mode=Mode.SUBTRACT)
    add(fan_holes_tool9.solids().sort_by_distance((69.5, 16.1, -31))[0], mode=Mode.SUBTRACT)
    add(fan_holes_tool10.solids().sort_by_distance((19.5, 16.1, -31))[0], mode=Mode.SUBTRACT)

    # Sketch4 → Length Air Vents (cut, through all)
    with BuildSketch(Plane.XY.offset(56)):
        with Locations((0, 5.55)):
            Rectangle(SKETCH4_W, SKETCH4_H)
    extrude(amount=-LENGTH_AIR_VENTS_DEPTH, mode=Mode.SUBTRACT)

    # Sketch5 → Width Air Vents (cut, through all)
    with BuildSketch(Plane.ZY.offset(93.5)):
        with Locations((0, 5.55)):
            Rectangle(SKETCH5_W, SKETCH5_H)
    extrude(amount=-WIDTH_AIR_VENTS_DEPTH, mode=Mode.SUBTRACT)

    # Fillet1
    fillet1_edges = [part.edges().sort_by_distance(p)[0] for p in [
        (-93.5, 8.05, -56),
        (93.5, 8.05, -56),
        (93.5, 8.05, 56),
        (93.5, 16.1, 0),
        (0, 16.1, -56),
        (-93.5, 16.1, 0),
        (0, 16.1, 56),
        (-93.5, 8.05, 56),
    ]]
    fillet(fillet1_edges, radius=FILLET1_R)


solid = part.part
